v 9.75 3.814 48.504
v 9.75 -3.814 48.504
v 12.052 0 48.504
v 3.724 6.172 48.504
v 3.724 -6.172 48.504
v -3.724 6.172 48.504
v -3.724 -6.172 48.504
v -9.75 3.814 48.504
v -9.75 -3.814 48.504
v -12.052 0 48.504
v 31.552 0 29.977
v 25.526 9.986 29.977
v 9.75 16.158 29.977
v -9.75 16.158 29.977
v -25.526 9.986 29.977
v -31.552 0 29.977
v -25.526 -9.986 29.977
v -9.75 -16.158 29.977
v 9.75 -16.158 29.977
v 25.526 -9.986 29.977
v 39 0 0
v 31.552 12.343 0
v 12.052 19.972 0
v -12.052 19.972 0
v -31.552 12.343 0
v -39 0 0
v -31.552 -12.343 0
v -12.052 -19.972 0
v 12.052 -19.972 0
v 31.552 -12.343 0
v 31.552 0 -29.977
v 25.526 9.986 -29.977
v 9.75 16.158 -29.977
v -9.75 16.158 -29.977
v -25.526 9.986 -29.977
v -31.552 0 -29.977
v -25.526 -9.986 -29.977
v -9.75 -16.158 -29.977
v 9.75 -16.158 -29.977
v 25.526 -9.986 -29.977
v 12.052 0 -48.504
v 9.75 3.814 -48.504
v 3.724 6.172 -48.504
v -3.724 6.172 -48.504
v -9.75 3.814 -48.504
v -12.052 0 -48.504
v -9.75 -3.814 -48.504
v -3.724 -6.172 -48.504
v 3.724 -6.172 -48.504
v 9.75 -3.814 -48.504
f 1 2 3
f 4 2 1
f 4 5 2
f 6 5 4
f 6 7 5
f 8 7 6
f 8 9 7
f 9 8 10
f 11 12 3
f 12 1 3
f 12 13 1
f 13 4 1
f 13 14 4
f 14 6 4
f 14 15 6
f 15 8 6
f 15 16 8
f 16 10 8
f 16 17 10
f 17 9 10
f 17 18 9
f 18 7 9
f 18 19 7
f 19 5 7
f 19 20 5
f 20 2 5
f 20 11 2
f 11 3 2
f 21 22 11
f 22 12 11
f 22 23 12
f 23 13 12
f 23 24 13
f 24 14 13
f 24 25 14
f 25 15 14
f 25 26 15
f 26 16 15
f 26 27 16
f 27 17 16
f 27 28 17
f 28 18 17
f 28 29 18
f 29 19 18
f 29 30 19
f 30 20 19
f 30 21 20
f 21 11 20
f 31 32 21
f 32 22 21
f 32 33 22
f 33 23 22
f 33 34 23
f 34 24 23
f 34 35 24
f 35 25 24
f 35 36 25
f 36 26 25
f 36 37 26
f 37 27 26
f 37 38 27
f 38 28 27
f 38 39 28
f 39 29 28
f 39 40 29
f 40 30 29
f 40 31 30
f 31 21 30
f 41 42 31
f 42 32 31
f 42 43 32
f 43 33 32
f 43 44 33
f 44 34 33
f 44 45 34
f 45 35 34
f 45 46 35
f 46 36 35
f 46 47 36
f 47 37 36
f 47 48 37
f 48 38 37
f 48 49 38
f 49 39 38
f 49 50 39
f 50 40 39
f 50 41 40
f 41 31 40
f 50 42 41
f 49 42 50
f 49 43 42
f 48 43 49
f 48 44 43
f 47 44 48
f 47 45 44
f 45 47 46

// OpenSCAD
// Generated by SolidPython 1.0.1 on 2020-07-29 00:46:50


scale(v = [13, 7, 17]) {
	sphere(r = 3);
}
/***********************************************
*********      SolidPython code:      **********
************************************************
 
# import packages: SolidPython
from solid import *
from solid.utils import *
from itertools import chain, combinations, permutations


class Resize:

    def __init__(self, scad_file):
        self.scad_file = scad_file
        #self.scad_file = import_scad(scad_file)
        # cone/cylinder param:
        self.r1 = 0
        self.r2 = 0
        self.h = 0
        # rectangular prism param:
        self.w = 0
        self.l = 0
        # ellipse param:
        self.r = 0

    # import OpenScad code (file name corresponds to shape)


    # classify shape + parameters
    def assign(self, param1, param2, param3):
        if self.scad_file == 'cone.scad':
            self.r1 = param1
            self.r2 = param2
            self.h = param3
        elif self.scad_file == 'cylinder.scad':
            self.r1 = param1
            self.r2 = param2
            self.h = param3
        elif self.scad_file == 'rectangularPrism.scad':
            self.h = param1
            self.l = param2
            self.w = param3
        else:
            self.r = param1
            self.h = param2

    # resize parameters
    def iterate(self):
        x = range(3, 20, 2)
        i = 1
        if self.scad_file == 'cone.scad':
            tempList = list(permutations(x, 2))
            for temp in tempList:
                param1 = temp[0]
                param2 = temp[1]
                filepath = 'produced_scad_files/' + 'cone' + str(param1) + '_' + str(param2) + '_' + '.scad'
                scad_render_to_file(cylinder(h=param1, r1=param2, r2=0), filepath)

        elif self.scad_file == 'cylinder.scad':
            tempList = list(permutations(x, 3))
            for temp in tempList:
                param1 = temp[0]
                param2 = temp[1]
                filepath = 'produced_scad_files/' + 'cylinder' + str(param1) + '_' + str(param2) + '_' + '.scad'
                scad_render_to_file(cylinder(h=param1, r1=param2, r2=param2), filepath)

        elif self.scad_file == 'rectangularPrism.scad':
            tempList = list(permutations(x, 3))
            for temp in tempList:
                param1 = temp[0]
                param2 = temp[1]
                param3 = temp[2]
                filepath = 'produced_scad_files/' + 'rectangularPrism' + str(param1) + '_' + str(param2) + '_' + str(
                    param3) + '.scad'
                scad_render_to_file(cube(size=(param1, param2, param3)), filepath)

        elif self.scad_file == 'ellipse.scad':
            tempList = list(permutations(x, 4))
            for temp in tempList:
                param1 = temp[0]
                param2 = temp[1]
                param3 = temp[2]
                param4 = temp[3]
                filepath = 'produced_scad_files/' + 'ellipse' + str(param1) + '_' + str(param2) + '_' + str(param3) + '_' + str(param4) + '.scad'
                scad_render_to_file(scale([param1, param2, param3])(sphere(r=param4)), filepath)

    def render_to_scadfile(self):
        scad_render_to_file(scad, 'example.scad') 
 
************************************************/
